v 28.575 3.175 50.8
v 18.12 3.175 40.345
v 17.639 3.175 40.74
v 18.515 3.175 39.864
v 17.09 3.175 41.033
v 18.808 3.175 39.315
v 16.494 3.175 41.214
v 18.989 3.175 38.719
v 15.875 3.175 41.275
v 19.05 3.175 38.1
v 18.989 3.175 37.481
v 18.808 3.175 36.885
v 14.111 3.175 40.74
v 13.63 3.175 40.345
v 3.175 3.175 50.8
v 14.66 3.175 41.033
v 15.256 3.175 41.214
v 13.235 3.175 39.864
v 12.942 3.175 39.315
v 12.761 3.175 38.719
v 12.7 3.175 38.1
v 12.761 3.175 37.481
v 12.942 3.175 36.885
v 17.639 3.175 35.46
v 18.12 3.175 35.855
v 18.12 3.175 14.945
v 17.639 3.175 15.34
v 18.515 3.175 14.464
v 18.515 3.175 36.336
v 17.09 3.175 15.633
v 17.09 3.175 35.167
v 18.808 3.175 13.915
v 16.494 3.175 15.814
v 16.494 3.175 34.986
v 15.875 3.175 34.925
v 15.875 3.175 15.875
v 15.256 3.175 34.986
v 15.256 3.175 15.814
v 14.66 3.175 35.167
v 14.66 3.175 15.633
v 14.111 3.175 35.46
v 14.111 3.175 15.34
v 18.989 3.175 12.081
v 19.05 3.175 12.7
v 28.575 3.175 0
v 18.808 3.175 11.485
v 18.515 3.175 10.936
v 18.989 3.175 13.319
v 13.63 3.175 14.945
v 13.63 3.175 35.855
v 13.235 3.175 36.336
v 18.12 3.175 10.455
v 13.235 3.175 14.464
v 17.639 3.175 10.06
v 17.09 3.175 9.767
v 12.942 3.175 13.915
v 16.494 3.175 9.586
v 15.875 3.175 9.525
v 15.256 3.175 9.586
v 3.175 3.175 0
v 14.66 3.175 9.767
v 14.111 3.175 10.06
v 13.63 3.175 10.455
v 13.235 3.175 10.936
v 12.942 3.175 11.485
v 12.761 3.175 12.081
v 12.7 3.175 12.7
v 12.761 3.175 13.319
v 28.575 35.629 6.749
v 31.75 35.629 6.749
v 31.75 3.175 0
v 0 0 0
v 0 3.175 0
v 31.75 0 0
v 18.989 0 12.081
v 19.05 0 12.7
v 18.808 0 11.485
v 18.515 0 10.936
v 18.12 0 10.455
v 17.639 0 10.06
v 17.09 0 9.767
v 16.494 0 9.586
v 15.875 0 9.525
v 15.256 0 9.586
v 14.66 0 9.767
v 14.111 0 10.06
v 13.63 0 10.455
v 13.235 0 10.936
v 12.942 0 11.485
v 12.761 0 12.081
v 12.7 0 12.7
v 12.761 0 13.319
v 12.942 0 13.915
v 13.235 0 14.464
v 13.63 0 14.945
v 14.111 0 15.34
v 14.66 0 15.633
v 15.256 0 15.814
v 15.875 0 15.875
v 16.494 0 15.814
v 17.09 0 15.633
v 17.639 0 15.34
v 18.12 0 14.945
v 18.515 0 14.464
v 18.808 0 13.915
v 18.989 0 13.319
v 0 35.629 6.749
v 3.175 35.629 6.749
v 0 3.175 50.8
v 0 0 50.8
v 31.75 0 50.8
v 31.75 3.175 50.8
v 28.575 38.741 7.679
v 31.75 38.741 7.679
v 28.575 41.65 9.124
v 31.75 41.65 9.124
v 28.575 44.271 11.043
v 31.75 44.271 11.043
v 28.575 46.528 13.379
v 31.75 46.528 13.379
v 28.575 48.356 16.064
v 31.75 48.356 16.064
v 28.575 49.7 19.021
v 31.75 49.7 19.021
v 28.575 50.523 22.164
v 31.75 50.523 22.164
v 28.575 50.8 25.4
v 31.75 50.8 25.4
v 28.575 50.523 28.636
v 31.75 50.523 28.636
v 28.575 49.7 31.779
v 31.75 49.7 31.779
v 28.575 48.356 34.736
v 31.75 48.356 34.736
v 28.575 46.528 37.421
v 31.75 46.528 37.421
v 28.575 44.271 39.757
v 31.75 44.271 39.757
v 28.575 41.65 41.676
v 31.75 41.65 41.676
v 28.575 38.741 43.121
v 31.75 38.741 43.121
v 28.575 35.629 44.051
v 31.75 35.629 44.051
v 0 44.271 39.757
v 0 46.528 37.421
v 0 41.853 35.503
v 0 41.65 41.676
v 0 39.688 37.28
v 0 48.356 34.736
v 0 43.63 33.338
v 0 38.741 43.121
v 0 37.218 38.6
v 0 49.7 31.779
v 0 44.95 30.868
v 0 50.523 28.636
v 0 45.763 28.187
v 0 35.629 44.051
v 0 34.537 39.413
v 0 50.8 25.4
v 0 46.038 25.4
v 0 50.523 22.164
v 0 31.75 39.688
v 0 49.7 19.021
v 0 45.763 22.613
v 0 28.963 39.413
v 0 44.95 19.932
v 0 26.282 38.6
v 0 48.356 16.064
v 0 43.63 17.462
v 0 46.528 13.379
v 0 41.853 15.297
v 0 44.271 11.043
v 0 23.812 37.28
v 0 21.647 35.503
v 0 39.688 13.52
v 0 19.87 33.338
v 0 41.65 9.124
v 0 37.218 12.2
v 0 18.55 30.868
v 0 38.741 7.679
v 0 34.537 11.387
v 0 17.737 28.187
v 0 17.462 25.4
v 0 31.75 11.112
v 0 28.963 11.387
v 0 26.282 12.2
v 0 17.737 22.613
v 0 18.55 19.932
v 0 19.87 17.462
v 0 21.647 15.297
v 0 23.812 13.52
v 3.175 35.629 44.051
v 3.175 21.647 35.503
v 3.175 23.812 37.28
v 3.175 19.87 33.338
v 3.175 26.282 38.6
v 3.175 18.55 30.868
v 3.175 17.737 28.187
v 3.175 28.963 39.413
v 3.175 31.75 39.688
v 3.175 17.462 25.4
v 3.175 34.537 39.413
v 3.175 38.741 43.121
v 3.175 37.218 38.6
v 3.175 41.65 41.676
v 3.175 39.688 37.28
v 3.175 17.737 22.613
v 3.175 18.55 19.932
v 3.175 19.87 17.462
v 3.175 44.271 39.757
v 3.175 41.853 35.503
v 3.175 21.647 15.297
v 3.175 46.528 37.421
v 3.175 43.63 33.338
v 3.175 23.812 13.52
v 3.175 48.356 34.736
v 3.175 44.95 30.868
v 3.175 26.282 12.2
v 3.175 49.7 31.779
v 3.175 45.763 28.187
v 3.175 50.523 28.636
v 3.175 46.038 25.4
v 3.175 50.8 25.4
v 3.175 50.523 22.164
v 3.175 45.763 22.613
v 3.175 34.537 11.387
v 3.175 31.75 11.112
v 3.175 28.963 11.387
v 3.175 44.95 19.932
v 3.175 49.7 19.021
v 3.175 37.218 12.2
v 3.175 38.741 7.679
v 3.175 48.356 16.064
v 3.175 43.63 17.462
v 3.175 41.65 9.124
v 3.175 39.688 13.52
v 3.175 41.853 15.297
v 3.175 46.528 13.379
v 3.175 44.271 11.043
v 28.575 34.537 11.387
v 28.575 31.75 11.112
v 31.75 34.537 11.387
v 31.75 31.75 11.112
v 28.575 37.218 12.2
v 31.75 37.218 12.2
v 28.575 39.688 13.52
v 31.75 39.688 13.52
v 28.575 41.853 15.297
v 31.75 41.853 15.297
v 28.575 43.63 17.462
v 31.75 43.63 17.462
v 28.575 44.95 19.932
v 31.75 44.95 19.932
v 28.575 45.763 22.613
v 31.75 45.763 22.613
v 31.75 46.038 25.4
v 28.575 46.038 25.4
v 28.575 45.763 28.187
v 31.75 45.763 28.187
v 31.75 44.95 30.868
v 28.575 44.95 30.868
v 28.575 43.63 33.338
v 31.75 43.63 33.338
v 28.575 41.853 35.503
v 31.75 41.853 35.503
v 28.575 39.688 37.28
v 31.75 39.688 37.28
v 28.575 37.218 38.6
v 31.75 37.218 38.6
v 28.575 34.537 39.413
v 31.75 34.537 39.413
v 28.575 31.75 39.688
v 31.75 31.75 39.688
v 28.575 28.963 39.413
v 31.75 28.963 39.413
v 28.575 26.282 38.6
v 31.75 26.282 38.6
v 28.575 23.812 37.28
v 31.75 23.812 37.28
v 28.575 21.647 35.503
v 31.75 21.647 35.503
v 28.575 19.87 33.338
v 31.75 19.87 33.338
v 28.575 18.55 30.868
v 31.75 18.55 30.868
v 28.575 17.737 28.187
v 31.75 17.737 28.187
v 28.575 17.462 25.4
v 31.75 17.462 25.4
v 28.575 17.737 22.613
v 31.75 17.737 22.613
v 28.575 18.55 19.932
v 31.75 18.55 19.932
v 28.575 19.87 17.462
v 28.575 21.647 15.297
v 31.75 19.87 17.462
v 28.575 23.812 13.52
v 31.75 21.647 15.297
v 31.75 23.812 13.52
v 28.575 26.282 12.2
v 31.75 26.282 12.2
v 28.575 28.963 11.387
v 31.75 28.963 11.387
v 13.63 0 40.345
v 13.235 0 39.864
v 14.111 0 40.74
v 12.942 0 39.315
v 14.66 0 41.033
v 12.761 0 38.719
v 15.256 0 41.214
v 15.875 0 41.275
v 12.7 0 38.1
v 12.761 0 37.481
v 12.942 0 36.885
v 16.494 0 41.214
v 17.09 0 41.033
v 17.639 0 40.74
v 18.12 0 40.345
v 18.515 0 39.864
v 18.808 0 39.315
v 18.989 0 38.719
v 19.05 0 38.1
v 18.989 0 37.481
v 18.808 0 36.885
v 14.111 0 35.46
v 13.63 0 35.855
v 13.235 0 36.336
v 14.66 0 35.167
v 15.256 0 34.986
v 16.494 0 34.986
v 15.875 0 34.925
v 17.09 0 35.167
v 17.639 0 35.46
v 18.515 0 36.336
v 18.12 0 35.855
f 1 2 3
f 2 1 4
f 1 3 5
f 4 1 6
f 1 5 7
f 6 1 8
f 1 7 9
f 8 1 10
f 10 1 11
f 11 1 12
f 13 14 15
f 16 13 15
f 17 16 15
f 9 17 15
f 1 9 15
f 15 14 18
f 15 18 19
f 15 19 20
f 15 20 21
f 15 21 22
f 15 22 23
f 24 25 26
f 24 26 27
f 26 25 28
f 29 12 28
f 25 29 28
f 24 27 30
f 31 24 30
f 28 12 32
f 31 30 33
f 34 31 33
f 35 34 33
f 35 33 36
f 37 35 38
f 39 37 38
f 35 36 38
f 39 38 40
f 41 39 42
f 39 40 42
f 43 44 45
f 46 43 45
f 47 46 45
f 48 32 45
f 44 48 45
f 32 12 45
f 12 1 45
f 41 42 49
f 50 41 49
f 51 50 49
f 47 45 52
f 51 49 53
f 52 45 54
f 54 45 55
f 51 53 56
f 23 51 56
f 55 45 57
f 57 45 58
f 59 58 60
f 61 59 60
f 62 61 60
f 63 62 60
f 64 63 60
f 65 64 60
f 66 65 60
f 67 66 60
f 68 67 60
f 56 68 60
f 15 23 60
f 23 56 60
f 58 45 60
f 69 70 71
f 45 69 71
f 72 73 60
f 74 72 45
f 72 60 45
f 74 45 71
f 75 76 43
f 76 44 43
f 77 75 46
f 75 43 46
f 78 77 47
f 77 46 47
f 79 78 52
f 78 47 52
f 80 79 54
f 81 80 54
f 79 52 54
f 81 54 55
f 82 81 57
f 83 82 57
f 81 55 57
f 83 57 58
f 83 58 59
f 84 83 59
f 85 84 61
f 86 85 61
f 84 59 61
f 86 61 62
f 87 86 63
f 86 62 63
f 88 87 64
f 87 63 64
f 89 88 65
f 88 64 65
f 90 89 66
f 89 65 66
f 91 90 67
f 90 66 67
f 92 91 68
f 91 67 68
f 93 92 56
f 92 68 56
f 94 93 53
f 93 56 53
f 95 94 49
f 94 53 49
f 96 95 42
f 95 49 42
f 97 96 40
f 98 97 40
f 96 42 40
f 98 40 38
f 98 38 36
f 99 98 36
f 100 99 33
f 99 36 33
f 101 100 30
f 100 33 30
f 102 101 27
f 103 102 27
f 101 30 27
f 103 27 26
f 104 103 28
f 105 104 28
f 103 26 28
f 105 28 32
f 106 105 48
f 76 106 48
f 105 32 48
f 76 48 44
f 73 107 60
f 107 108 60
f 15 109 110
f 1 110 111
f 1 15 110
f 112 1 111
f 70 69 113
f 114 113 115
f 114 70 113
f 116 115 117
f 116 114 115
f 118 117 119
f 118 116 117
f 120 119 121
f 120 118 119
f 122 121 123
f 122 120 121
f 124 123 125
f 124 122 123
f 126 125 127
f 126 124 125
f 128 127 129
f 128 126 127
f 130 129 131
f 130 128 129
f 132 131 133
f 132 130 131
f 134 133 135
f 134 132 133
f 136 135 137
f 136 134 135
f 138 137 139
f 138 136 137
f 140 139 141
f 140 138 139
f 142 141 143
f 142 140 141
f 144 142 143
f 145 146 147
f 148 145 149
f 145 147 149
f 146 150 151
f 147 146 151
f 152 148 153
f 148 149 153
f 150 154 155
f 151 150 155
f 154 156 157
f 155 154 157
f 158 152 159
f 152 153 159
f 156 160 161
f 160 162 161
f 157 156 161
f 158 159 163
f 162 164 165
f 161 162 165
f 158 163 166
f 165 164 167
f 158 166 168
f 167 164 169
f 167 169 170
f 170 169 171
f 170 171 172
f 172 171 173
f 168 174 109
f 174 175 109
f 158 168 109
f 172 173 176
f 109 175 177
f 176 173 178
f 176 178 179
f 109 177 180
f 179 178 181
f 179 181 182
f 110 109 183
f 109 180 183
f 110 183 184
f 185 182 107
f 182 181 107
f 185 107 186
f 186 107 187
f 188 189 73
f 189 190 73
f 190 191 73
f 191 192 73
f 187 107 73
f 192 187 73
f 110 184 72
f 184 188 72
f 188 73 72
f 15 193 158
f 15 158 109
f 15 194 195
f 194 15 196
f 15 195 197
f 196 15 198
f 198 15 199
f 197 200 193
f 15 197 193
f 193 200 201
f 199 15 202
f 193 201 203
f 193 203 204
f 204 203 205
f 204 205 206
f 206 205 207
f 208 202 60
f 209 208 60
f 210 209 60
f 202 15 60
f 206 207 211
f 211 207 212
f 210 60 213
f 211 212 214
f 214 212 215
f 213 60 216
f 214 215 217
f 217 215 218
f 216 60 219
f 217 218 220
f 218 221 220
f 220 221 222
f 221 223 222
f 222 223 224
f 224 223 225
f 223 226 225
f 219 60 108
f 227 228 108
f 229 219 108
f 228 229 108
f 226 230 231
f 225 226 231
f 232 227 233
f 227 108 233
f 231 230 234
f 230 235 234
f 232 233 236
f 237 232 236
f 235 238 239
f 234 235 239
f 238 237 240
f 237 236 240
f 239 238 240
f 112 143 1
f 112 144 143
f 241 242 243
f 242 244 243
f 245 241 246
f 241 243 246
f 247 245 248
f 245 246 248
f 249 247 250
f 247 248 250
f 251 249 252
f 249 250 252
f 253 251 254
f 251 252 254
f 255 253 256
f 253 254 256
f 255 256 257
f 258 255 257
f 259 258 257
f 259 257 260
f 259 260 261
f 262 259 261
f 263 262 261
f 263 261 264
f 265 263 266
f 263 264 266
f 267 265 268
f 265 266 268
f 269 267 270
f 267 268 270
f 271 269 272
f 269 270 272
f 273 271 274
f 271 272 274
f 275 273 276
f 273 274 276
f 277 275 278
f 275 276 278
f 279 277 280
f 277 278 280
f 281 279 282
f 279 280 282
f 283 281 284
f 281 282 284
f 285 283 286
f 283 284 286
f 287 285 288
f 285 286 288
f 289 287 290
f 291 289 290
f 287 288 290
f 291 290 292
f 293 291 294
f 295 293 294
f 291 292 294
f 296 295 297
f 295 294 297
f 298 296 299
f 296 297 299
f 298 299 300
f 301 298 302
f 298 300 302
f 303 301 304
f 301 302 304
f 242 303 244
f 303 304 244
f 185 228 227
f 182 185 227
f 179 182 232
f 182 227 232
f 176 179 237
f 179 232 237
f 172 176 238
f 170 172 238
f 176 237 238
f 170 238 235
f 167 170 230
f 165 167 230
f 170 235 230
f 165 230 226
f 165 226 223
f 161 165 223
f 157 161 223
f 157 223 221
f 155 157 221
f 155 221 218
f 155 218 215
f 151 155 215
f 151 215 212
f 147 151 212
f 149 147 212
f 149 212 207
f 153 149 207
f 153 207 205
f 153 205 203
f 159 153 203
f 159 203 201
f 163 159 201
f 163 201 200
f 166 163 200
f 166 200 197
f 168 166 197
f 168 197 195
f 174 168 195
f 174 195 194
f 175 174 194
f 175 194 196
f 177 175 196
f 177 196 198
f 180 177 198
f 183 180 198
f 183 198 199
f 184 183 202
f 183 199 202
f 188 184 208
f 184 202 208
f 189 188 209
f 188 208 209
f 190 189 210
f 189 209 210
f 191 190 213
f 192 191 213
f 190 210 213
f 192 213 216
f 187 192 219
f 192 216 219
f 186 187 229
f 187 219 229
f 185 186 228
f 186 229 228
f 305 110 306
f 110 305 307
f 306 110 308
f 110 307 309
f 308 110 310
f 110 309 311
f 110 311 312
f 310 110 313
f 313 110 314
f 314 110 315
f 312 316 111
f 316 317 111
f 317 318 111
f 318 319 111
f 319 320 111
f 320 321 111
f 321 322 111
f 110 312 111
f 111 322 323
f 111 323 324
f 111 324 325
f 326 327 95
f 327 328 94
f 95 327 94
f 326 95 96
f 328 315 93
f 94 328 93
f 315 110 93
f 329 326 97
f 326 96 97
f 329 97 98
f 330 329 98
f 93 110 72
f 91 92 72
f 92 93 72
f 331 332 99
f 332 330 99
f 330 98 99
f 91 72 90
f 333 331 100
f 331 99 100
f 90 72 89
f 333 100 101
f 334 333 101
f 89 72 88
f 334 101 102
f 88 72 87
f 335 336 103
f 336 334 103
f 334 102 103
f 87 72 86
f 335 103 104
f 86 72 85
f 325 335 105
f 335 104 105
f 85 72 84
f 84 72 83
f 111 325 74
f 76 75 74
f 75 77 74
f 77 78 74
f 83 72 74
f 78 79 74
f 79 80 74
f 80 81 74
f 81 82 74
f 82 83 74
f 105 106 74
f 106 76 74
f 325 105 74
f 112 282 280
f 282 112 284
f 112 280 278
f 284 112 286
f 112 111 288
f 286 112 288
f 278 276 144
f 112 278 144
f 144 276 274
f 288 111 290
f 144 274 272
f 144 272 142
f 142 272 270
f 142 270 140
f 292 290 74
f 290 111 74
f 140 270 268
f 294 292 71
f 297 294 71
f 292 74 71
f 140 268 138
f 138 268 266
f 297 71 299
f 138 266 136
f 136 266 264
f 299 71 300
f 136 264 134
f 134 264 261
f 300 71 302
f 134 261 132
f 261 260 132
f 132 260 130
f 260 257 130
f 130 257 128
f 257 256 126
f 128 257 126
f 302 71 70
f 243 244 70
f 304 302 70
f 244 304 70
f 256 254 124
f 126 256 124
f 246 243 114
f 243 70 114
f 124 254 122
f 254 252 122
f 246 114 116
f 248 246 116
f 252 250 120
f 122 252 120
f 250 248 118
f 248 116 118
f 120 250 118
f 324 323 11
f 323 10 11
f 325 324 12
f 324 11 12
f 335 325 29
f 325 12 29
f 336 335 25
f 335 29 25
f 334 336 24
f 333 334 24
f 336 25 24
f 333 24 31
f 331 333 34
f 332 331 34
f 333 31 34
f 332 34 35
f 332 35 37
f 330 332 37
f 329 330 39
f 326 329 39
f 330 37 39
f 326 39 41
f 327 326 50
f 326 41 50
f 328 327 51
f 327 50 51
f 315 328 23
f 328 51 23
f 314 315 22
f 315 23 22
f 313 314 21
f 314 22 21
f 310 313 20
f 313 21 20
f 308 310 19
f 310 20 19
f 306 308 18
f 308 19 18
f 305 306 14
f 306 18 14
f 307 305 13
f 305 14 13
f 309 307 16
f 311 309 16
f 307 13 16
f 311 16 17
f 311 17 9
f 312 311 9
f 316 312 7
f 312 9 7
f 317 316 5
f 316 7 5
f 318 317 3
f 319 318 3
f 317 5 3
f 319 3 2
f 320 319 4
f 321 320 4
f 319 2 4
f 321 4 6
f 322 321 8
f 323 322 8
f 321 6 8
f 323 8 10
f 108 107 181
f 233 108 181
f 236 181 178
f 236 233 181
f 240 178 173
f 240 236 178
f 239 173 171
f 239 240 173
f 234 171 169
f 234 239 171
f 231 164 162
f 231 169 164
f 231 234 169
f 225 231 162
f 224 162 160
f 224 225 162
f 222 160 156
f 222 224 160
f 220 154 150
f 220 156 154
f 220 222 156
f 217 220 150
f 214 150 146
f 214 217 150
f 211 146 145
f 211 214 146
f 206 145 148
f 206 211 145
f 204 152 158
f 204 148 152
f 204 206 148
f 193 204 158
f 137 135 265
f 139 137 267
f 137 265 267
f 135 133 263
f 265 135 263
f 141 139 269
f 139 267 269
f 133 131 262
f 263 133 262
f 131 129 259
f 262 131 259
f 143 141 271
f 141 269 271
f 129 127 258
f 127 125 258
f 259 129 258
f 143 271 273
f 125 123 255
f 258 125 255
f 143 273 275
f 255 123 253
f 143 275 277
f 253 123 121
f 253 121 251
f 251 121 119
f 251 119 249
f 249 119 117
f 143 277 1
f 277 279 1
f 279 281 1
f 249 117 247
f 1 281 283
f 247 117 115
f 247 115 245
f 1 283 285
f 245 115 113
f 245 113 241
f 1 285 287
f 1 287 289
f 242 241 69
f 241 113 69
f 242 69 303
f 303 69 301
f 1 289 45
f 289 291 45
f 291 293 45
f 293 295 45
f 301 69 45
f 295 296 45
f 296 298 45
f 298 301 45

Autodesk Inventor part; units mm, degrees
ref_plane "YZ Plane" through (0, 0, 0) normal (1, 0, 0) x (0, 1, 0)
ref_plane "XZ Plane" through (0, 0, 0) normal (0, 1, 0) x (-1, 0, 0)
ref_plane "XY Plane" through (0, 0, 0) normal (0, 0, 1) x (1, 0, 0)
sketch "Sketch1" plane through (0, 0, 0) normal (0, 0, 1) x (1, 0, 0)
  line L0 (0, 0) -> (31.75, 0)
  line L1 (31.75, 0) -> (31.75, 50.8)
  line L2 (0, 50.8) -> (0, 0)
  line L3 (28.575, 50.8) -> (28.575, 3.175)
  line L4 (28.575, 3.175) -> (3.175, 3.175)
  line L5 (3.175, 3.175) -> (3.175, 50.8)
  line L6 (0, 50.8) -> (3.175, 50.8)
  line L7 (28.575, 50.8) -> (31.75, 50.8)
  dimension "d0" = 50.8
  dimension "d1" = 31.75
  dimension "d2" = 3.175
  dimension "d3" = 3.175
  dimension "d4" = 3.175
extrude "Extrusion1" add sketch "Sketch1" along normal blind 50.8
sketch "Sketch2" plane through (31.75, 0, 0) normal (1, 0, 0) x (0, 0, -1)
  line L0 (-50.8, 50.8) -> (-50.8, 0) projected
  line L1 (0, 0) -> (0, 50.8) projected
  line L2 (0, 50.8) -> (-50.8, 50.8) projected
  line L3 (0, 3.175) -> (-50.8, 3.175) projected
  circle A0 centre (-25.4, 31.75) radius 14.2875
  arc A1 (-6.749, 35.6286) -> (-44.051, 35.6286) centre (-25.4, 31.75) ccw
  line L4 (-44.051, 35.6286) -> (-50.8, 3.175)
  line L5 (-6.749, 35.6286) -> (0, 3.175)
  dimension "d7" = 28.575
  dimension "d8" = 25.4
  dimension "d9" = 19.05
extrude "Extrusion2" cut sketch "Sketch2" against normal blind 50.8 contours L2 A1 L4 L0 | L2 L1 L5 A1 | A0
sketch "Sketch3" plane through (3.175, 3.175, 50.8) normal (0, 1, 0) x (1, 0, 0)
  line L0 (0, 0) -> (25.4, 0) projected
  line L1 (25.4, 50.8) -> (25.4, 0) projected
  line L2 (25.4, 50.8) -> (0, 50.8) projected
  circle A0 centre (12.7, 38.1) radius 3.175
  circle A1 centre (12.7, 12.7) radius 3.175
  line L3 (0, 50.8) -> (0, 0) projected
  point P0 (-3.175, 50.8)
  dimension "d12" = 6.35
  dimension "d13" = 6.35
  dimension "d14" = 12.7
  dimension "d15" = 12.7
  dimension "d16" = 12.7
  dimension "d17" = 12.7
  dimension "d20" = 25.4
extrude "Extrusion3" cut sketch "Sketch3" against normal blind 50.8 contours A0 | A1
equation "\"d3\" = d2"
equation "\"d4\" = d2"
equation "\"d12\" = d13"
equation "\"d15\" = 0.5 * d20"
equation "\"d16\" = d14"
equation "\"d17\" = d15"
properties part number "apendage bearing braket"
